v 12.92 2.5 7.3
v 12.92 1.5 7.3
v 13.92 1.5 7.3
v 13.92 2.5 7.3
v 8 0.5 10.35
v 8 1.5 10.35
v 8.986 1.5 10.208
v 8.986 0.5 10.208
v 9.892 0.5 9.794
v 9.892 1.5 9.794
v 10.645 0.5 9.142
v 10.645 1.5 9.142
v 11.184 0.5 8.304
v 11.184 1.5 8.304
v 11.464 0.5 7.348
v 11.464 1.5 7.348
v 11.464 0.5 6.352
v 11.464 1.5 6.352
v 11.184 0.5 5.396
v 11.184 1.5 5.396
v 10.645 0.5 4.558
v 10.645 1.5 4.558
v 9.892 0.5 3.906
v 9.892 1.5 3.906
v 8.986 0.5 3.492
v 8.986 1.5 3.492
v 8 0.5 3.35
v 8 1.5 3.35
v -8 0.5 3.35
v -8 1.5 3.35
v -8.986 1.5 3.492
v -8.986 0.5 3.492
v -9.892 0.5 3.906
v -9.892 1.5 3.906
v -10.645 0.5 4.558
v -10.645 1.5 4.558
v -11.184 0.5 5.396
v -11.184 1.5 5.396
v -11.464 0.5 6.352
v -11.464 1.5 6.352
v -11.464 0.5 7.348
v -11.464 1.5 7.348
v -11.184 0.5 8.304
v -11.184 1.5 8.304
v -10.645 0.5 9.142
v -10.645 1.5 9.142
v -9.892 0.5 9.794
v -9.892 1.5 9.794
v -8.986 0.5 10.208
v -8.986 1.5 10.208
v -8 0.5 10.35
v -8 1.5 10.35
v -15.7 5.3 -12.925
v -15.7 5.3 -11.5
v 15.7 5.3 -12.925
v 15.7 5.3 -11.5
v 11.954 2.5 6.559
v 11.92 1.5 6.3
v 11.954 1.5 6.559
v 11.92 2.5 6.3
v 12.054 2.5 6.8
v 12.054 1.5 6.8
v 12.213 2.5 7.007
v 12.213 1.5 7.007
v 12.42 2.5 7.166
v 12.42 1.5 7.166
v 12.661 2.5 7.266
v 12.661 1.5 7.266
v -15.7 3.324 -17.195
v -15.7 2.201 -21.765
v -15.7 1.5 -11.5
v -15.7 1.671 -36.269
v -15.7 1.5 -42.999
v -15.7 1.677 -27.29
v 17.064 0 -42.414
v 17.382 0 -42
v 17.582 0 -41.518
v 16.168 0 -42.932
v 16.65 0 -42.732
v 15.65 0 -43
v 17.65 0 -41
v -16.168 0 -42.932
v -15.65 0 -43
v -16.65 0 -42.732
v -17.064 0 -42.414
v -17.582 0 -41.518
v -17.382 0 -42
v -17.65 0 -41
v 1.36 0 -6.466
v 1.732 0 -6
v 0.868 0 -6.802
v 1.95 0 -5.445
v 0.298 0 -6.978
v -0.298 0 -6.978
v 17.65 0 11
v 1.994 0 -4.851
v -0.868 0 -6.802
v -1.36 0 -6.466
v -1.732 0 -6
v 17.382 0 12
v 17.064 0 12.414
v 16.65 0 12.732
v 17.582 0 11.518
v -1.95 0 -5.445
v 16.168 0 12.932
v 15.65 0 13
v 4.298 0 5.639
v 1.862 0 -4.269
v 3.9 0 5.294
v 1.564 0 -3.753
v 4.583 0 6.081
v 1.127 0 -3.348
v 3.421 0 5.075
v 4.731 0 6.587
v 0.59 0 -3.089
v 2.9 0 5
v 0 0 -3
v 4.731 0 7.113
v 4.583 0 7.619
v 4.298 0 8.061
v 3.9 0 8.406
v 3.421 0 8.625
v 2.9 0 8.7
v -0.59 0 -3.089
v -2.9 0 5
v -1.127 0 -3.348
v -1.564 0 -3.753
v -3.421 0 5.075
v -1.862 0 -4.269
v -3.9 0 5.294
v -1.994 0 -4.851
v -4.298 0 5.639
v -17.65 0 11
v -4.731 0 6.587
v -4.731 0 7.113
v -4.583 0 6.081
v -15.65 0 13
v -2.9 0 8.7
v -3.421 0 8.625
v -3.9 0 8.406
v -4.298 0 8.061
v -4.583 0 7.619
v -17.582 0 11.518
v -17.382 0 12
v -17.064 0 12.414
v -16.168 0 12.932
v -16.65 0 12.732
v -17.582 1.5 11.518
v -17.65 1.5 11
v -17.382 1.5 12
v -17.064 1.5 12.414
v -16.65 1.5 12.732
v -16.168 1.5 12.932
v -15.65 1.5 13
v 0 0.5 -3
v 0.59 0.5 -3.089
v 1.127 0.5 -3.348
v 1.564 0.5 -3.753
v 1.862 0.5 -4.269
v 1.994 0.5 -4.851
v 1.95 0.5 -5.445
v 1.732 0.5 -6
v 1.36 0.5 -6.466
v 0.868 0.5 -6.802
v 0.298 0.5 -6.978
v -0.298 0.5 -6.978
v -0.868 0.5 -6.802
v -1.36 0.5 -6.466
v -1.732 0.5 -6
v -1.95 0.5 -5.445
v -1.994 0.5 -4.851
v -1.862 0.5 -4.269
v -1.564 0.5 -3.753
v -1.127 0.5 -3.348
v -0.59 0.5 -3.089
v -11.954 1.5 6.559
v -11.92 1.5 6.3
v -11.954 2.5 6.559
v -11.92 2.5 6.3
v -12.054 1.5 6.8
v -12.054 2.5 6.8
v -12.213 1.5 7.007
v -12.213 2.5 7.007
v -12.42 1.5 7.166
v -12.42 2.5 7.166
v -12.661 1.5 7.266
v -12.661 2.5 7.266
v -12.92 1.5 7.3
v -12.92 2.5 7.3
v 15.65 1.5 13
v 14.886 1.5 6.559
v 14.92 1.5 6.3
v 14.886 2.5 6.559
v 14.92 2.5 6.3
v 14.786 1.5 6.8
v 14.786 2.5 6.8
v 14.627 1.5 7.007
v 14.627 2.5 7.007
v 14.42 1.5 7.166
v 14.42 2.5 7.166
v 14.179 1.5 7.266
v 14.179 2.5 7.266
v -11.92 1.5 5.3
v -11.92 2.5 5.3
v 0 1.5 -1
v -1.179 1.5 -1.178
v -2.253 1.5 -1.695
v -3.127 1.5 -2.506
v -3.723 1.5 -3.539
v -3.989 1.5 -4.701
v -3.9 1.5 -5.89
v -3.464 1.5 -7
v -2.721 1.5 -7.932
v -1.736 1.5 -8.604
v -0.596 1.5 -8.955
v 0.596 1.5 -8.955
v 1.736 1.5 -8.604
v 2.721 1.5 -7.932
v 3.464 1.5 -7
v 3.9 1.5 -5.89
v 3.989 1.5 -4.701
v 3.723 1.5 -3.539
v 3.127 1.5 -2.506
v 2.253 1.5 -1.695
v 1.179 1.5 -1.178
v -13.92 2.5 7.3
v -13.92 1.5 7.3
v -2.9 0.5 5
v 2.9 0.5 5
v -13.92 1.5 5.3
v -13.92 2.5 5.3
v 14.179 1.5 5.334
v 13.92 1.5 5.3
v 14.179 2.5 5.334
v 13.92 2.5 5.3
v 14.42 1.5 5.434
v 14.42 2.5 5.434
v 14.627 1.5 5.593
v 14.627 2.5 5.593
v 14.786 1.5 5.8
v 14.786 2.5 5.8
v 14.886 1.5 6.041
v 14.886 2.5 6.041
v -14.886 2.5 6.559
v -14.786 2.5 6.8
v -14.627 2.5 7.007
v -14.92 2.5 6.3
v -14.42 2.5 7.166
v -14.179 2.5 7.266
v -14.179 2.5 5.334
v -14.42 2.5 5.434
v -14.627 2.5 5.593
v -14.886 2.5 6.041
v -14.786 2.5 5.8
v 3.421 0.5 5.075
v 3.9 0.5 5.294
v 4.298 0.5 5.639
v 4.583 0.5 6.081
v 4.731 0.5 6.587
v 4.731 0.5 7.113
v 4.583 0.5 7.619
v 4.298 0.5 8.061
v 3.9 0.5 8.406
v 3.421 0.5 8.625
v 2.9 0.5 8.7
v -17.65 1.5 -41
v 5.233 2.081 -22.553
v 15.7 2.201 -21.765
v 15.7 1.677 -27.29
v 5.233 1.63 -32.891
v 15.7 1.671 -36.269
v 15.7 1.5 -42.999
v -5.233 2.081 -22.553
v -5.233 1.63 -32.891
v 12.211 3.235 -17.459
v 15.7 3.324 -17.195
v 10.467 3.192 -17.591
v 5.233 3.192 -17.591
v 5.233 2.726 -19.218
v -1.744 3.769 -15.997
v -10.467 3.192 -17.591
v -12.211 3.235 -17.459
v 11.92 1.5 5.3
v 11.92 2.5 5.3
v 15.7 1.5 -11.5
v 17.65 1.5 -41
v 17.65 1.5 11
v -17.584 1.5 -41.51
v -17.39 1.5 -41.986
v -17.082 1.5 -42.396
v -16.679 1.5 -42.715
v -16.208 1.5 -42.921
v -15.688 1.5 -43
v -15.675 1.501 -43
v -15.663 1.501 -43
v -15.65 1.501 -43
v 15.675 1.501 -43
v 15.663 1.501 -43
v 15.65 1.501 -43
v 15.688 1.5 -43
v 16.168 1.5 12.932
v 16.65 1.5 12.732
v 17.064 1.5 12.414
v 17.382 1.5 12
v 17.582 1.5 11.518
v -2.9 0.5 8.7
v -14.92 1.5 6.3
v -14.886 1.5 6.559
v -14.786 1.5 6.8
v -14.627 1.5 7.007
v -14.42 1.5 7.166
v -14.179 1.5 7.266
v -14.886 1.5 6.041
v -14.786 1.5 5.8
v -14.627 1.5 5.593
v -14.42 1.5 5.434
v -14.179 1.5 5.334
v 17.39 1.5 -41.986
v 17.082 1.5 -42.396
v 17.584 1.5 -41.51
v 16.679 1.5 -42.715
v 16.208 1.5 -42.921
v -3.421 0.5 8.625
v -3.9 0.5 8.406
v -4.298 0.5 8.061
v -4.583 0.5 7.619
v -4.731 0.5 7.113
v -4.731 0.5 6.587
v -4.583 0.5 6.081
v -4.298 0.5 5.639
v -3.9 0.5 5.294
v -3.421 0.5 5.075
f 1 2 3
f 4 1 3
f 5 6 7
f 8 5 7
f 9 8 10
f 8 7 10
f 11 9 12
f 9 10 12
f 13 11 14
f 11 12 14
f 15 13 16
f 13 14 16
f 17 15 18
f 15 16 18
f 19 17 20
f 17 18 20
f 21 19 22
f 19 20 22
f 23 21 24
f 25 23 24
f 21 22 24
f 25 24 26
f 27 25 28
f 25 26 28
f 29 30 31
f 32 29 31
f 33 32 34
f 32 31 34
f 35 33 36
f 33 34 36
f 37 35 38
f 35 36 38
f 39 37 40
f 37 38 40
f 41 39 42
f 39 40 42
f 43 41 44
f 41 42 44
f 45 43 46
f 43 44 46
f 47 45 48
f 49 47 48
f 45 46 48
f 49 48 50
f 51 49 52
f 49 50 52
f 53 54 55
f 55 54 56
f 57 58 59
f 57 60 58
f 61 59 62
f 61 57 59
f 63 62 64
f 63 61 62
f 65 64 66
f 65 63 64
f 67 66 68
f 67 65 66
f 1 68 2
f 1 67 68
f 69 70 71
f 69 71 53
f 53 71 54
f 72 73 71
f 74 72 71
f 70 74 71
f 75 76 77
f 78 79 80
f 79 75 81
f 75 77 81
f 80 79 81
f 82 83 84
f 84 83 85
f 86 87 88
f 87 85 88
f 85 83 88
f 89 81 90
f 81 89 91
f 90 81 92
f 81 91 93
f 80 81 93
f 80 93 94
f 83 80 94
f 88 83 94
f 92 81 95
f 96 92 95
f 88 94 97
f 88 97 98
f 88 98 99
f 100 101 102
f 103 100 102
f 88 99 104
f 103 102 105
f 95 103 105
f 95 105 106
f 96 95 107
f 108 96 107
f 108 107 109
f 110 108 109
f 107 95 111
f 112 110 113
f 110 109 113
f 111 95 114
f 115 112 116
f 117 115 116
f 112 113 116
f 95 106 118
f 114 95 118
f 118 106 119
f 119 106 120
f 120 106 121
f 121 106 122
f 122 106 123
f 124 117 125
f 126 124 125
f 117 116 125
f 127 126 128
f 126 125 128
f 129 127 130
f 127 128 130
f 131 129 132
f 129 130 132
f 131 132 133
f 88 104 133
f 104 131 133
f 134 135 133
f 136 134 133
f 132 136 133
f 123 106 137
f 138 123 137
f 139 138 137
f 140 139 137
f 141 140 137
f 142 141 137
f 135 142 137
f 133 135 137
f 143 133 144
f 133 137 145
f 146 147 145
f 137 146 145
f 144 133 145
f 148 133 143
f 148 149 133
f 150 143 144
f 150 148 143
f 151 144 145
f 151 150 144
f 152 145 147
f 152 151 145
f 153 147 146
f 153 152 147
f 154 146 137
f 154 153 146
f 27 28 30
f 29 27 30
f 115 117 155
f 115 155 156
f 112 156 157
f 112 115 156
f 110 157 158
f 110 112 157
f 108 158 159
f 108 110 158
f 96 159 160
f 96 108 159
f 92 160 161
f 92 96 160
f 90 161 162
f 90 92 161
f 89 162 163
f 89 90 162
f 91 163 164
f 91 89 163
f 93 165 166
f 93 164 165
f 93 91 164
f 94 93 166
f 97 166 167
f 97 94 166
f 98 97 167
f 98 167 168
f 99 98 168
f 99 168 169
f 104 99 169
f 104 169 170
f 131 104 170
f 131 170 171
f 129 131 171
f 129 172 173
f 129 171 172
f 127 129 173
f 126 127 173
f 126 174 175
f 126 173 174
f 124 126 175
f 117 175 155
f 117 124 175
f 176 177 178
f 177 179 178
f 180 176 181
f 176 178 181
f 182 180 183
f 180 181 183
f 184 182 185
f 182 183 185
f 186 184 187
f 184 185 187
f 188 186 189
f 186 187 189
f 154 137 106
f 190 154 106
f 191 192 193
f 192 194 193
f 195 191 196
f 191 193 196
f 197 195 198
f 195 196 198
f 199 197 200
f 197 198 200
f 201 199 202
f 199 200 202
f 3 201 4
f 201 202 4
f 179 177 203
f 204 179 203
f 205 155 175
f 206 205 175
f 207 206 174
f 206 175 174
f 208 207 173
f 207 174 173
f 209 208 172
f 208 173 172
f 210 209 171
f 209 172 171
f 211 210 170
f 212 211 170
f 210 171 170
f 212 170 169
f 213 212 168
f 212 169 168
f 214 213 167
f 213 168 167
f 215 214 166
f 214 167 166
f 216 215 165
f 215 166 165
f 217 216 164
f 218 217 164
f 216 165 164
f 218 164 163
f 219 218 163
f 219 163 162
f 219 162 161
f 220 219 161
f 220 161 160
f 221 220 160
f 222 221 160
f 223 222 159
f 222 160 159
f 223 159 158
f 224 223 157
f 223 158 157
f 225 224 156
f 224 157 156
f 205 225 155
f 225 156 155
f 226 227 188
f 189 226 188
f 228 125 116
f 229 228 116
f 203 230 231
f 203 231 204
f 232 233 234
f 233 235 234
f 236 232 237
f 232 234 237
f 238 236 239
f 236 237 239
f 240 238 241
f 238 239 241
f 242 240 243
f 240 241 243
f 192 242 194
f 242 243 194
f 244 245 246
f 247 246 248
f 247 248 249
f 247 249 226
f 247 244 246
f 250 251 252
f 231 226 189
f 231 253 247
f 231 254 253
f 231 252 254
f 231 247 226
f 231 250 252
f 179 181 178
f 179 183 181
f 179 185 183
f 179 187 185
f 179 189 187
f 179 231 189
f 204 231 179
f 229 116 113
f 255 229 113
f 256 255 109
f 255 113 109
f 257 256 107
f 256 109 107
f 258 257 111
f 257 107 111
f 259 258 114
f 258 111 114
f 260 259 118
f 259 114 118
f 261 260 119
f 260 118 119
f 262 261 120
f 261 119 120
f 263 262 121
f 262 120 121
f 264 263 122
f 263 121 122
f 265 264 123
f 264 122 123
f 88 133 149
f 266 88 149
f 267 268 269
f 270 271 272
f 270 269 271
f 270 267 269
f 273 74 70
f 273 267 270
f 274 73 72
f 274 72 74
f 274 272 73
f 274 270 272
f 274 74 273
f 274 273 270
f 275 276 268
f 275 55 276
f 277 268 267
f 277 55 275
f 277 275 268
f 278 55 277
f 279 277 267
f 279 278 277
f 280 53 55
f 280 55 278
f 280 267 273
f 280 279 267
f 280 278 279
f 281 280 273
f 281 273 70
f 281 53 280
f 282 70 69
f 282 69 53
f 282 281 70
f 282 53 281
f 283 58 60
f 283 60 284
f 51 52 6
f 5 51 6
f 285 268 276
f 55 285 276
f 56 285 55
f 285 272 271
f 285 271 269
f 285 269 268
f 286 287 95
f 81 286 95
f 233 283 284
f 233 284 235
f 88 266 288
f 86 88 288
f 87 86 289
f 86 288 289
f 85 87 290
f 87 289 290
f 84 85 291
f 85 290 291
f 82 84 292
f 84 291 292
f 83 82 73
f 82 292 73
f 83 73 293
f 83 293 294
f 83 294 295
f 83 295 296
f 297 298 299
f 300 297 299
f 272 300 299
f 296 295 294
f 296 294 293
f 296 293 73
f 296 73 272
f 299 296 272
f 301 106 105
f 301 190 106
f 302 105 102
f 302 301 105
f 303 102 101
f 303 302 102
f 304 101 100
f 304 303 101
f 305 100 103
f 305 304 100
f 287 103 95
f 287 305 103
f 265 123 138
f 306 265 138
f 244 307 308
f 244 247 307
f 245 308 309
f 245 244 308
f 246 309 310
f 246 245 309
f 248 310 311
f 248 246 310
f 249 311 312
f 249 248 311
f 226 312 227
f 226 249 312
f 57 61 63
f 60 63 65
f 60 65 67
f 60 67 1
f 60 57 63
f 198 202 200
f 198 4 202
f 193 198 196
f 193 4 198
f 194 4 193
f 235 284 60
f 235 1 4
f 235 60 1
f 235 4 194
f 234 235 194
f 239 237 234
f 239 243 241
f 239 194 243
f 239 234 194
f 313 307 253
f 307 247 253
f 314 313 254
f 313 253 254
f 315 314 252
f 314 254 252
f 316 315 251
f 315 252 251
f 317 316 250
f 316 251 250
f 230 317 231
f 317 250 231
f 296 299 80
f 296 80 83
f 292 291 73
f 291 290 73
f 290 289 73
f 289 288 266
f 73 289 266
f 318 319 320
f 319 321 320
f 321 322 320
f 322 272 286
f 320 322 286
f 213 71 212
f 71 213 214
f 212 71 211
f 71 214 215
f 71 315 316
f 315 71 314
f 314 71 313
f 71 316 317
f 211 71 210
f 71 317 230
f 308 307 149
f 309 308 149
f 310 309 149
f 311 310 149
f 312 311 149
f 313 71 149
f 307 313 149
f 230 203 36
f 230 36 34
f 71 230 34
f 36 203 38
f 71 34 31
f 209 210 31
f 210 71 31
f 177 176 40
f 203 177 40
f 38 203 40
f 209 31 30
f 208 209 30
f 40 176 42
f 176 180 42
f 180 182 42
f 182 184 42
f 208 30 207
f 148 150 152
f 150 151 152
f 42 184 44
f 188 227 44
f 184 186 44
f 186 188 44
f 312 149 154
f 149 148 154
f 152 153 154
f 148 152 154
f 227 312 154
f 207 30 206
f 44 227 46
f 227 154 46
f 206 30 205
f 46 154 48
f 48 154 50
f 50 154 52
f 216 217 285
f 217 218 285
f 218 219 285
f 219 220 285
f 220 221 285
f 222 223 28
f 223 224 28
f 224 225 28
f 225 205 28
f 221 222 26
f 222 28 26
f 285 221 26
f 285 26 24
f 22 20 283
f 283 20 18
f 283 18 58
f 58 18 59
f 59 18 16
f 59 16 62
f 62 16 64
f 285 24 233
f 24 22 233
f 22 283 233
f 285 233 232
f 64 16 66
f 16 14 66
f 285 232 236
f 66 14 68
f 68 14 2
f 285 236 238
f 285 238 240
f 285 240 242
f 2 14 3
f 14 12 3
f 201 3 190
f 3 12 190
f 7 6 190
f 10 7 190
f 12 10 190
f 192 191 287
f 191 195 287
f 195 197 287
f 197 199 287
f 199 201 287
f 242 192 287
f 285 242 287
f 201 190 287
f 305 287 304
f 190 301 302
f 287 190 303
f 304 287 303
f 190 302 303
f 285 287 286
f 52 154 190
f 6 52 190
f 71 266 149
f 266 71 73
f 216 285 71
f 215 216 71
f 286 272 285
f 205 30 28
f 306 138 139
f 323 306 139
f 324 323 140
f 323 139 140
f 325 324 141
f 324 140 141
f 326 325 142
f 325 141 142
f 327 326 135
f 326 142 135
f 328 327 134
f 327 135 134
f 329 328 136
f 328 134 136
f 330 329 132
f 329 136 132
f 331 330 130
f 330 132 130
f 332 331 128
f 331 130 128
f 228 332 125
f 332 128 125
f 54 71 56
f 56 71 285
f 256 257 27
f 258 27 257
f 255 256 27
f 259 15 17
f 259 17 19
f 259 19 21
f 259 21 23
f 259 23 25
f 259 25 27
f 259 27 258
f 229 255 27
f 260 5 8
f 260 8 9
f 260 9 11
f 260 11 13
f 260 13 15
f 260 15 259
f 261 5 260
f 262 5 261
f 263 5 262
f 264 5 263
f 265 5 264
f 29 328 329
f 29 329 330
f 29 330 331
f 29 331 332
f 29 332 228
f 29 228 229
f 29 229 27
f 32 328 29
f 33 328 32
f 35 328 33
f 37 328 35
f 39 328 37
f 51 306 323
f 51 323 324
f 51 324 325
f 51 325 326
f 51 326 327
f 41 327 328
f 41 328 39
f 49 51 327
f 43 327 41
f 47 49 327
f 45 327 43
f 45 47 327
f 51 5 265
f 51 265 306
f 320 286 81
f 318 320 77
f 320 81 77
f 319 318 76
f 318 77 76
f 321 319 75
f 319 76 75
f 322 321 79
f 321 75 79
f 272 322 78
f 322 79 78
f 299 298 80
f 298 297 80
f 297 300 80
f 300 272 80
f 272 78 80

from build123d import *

# Parameters (mm, degrees)
SKETCH1_W               = 35.3
SKETCH1_H               = 26
BOSS_EXTRUDE1_DEPTH     = 1.5
SKETCH2_W               = 31.8
SKETCH2_H               = 1.5
BOSS_EXTRUDE2_DEPTH     = 3.8
CUT_EXTRUDE1_DEPTH      = 23.247752695
CUT_EXTRUDE1_DEPTH_BACK = 23.247752695
SKETCH3_R               = 2
CHAMFER1_SIZE           = 2
CHAMFER1_SIZE2          = 1
FILLET1_R               = 2
BOSS_EXTRUDE3_DEPTH     = 30
FILLET2_R               = 2
SKETCH6_W               = 3
SKETCH6_H               = 2
BOSS_EXTRUDE4_DEPTH     = 1
FILLET4_R               = 1
SKETCH7_W               = 1.743977538
SKETCH7_H               = 6.350659455
SKETCH7_W_2             = 2.282976844
SKETCH7_H_2             = 7.649157782
CUT_EXTRUDE2_DEPTH      = 37.494691395
CUT_EXTRUDE5_DEPTH      = 55.674605623
CUT_EXTRUDE5_DEPTH_BACK = 55.674605623
CUT_EXTRUDE6_DEPTH      = 47.63649323
CUT_EXTRUDE6_DEPTH_BACK = 47.63649323
CUT_EXTRUDE7_START      = -1.5
CUT_EXTRUDE7_DEPTH      = 1


with BuildPart() as part:
    # Sketch1 → Boss-Extrude1 (new body)
    with BuildSketch(Plane(origin=(0, 0, 0), x_dir=(1, 0, 0), z_dir=(0, 1, 0))):
        Rectangle(SKETCH1_W, SKETCH1_H)
    extrude(amount=BOSS_EXTRUDE1_DEPTH)

    # Sketch2 → Boss-Extrude2 (add)
    with BuildSketch(Plane(origin=(0, 1.5, 0), x_dir=(1, 0, 0), z_dir=(0, 1, 0))):
        with Locations((0, 12.25)):
            Rectangle(SKETCH2_W, SKETCH2_H)
    extrude(amount=BOSS_EXTRUDE2_DEPTH)

    # Sketch3 → Cut-Extrude1 (cut, two sides: drawn at the far end of the back side and taken through both)
    with BuildSketch(Plane(origin=(0, 1.5, 0), x_dir=(1, 0, 0), z_dir=(0, 1, 0)).offset(-CUT_EXTRUDE1_DEPTH_BACK)):
        with Locations(Location((0, 5, 0), (0, 0, 270))):
            Circle(SKETCH3_R)
    extrude(amount=CUT_EXTRUDE1_DEPTH + CUT_EXTRUDE1_DEPTH_BACK, mode=Mode.SUBTRACT)

    # Chamfer1
    chamfer1_edges = [part.edges().sort_by_distance(p)[0] for p in [
        (0, 1.5, -7),
    ]]
    chamfer1_side = [part.faces().sort_by_distance(p)[0] for p in [
        (0, 1.5, 0.754672273),
    ]]
    chamfer(chamfer1_edges, length=CHAMFER1_SIZE, length2=CHAMFER1_SIZE2, reference=chamfer1_side[0])

    # Fillet1
    fillet1_edges = [part.edges().sort_by_distance(p)[0] for p in [
        (17.65, 0.75, 13),
        (-17.65, 0.75, 13),
    ]]
    fillet(fillet1_edges, radius=FILLET1_R)

    # Sketch4 → Boss-Extrude3 (add)
    with BuildSketch(Plane(origin=(0, 0, -13), x_dir=(-1, 0, 0), z_dir=(0, 0, -1))):
        Polygon((-15.9, 5.3), (-15.9, 1.5), (-17.65, 1.5), (-17.65, 0), (17.65, 0), (17.65, 1.5), (15.9, 1.5), (15.9, 5.3), align=None)
    extrude(amount=BOSS_EXTRUDE3_DEPTH)

    # Fillet2
    fillet2_edges = [part.edges().sort_by_distance(p)[0] for p in [
        (-17.65, 0.75, -43),
        (17.65, 0.75, -43),
    ]]
    fillet(fillet2_edges, radius=FILLET2_R)

    # Sketch6 → Boss-Extrude4 (add)
    with BuildSketch(Plane(origin=(0, 1.5, 0), x_dir=(1, 0, 0), z_dir=(0, 1, 0))):
        with Locations((-13.42, -6.3)):
            Rectangle(SKETCH6_W, SKETCH6_H)
        with Locations((13.42, -6.3)):
            Rectangle(SKETCH6_W, SKETCH6_H)
    extrude(amount=BOSS_EXTRUDE4_DEPTH)

    # Fillet4
    fillet4_edges = [part.edges().sort_by_distance(p)[0] for p in [
        (-14.92, 2, 5.3),
        (14.92, 2, 5.3),
        (14.92, 2, 7.3),
        (11.92, 2, 7.3),
        (-11.92, 2, 7.3),
        (-14.92, 2, 7.3),
    ]]
    fillet(fillet4_edges, radius=FILLET4_R - 0.0001)  # a hair under: the kernel refuses the full size

    # Sketch7 → Cut-Extrude2 (cut, through all)
    with BuildSketch(Plane.XY.offset(-11.5)):
        with Locations((-16.571988769, 4.675329728)):
            Rectangle(SKETCH7_W, SKETCH7_H)
        with Locations((16.841488422, 5.324578891)):
            Rectangle(SKETCH7_W_2, SKETCH7_H_2)
    extrude(amount=-CUT_EXTRUDE2_DEPTH, mode=Mode.SUBTRACT)

    # Sketch10 → Cut-Extrude5 (cut, two sides: drawn at the far end of the back side and taken through both)
    with BuildSketch(Plane(origin=(15.7, 0, 0), x_dir=(0, 0, -1), z_dir=(1, 0, 0)).offset(-CUT_EXTRUDE5_DEPTH_BACK)):
        with BuildLine():
            Line((12.925241615, 5.3), (13.354629123, 9.309511059))
            Line((13.354629123, 9.309511059), (48.378706372, 9.920156593))
            Line((48.378706372, 9.920156593), (42.999374902, 1.5))
            add(Edge.make_bspline(
                [(12.925241615, 5.3), (21.883759375, -0.11684658), (33.318611191, 2.283464976), (42.999374902, 1.5)],
                knots=[0, 0, 0, 0, 1, 1, 1, 1], degree=3))
        make_face()
    extrude(amount=CUT_EXTRUDE5_DEPTH + CUT_EXTRUDE5_DEPTH_BACK, mode=Mode.SUBTRACT)

    # Sketch12 → Cut-Extrude6 (cut, two sides: drawn at the far end of the back side and taken through both)
    with BuildSketch(Plane(origin=(0, 1.5, 0), x_dir=(1, 0, 0), z_dir=(0, 1, 0)).offset(-CUT_EXTRUDE6_DEPTH_BACK)):
        with BuildLine():
            Line((-2.9, -5), (2.9, -5))
            ThreePointArc((2.9, -5), (4.75, -6.85), (2.9, -8.7))
            Line((2.9, -8.7), (-2.9, -8.7))
            ThreePointArc((-2.9, -8.7), (-4.75, -6.85), (-2.9, -5))
        make_face()
    extrude(amount=CUT_EXTRUDE6_DEPTH + CUT_EXTRUDE6_DEPTH_BACK, mode=Mode.SUBTRACT)

    # Sketch13 → Cut-Extrude7 (cut)
    with BuildSketch(Plane.XZ.offset(CUT_EXTRUDE7_START)):
        with BuildLine():
            Line((-8, 10.35), (8, 10.35))
            ThreePointArc((8, 10.35), (11.5, 6.85), (8, 3.35))
            Line((8, 3.35), (-8, 3.35))
            ThreePointArc((-8, 3.35), (-11.5, 6.85), (-8, 10.35))
        make_face()
    extrude(amount=CUT_EXTRUDE7_DEPTH, mode=Mode.SUBTRACT)


solid = part.part
